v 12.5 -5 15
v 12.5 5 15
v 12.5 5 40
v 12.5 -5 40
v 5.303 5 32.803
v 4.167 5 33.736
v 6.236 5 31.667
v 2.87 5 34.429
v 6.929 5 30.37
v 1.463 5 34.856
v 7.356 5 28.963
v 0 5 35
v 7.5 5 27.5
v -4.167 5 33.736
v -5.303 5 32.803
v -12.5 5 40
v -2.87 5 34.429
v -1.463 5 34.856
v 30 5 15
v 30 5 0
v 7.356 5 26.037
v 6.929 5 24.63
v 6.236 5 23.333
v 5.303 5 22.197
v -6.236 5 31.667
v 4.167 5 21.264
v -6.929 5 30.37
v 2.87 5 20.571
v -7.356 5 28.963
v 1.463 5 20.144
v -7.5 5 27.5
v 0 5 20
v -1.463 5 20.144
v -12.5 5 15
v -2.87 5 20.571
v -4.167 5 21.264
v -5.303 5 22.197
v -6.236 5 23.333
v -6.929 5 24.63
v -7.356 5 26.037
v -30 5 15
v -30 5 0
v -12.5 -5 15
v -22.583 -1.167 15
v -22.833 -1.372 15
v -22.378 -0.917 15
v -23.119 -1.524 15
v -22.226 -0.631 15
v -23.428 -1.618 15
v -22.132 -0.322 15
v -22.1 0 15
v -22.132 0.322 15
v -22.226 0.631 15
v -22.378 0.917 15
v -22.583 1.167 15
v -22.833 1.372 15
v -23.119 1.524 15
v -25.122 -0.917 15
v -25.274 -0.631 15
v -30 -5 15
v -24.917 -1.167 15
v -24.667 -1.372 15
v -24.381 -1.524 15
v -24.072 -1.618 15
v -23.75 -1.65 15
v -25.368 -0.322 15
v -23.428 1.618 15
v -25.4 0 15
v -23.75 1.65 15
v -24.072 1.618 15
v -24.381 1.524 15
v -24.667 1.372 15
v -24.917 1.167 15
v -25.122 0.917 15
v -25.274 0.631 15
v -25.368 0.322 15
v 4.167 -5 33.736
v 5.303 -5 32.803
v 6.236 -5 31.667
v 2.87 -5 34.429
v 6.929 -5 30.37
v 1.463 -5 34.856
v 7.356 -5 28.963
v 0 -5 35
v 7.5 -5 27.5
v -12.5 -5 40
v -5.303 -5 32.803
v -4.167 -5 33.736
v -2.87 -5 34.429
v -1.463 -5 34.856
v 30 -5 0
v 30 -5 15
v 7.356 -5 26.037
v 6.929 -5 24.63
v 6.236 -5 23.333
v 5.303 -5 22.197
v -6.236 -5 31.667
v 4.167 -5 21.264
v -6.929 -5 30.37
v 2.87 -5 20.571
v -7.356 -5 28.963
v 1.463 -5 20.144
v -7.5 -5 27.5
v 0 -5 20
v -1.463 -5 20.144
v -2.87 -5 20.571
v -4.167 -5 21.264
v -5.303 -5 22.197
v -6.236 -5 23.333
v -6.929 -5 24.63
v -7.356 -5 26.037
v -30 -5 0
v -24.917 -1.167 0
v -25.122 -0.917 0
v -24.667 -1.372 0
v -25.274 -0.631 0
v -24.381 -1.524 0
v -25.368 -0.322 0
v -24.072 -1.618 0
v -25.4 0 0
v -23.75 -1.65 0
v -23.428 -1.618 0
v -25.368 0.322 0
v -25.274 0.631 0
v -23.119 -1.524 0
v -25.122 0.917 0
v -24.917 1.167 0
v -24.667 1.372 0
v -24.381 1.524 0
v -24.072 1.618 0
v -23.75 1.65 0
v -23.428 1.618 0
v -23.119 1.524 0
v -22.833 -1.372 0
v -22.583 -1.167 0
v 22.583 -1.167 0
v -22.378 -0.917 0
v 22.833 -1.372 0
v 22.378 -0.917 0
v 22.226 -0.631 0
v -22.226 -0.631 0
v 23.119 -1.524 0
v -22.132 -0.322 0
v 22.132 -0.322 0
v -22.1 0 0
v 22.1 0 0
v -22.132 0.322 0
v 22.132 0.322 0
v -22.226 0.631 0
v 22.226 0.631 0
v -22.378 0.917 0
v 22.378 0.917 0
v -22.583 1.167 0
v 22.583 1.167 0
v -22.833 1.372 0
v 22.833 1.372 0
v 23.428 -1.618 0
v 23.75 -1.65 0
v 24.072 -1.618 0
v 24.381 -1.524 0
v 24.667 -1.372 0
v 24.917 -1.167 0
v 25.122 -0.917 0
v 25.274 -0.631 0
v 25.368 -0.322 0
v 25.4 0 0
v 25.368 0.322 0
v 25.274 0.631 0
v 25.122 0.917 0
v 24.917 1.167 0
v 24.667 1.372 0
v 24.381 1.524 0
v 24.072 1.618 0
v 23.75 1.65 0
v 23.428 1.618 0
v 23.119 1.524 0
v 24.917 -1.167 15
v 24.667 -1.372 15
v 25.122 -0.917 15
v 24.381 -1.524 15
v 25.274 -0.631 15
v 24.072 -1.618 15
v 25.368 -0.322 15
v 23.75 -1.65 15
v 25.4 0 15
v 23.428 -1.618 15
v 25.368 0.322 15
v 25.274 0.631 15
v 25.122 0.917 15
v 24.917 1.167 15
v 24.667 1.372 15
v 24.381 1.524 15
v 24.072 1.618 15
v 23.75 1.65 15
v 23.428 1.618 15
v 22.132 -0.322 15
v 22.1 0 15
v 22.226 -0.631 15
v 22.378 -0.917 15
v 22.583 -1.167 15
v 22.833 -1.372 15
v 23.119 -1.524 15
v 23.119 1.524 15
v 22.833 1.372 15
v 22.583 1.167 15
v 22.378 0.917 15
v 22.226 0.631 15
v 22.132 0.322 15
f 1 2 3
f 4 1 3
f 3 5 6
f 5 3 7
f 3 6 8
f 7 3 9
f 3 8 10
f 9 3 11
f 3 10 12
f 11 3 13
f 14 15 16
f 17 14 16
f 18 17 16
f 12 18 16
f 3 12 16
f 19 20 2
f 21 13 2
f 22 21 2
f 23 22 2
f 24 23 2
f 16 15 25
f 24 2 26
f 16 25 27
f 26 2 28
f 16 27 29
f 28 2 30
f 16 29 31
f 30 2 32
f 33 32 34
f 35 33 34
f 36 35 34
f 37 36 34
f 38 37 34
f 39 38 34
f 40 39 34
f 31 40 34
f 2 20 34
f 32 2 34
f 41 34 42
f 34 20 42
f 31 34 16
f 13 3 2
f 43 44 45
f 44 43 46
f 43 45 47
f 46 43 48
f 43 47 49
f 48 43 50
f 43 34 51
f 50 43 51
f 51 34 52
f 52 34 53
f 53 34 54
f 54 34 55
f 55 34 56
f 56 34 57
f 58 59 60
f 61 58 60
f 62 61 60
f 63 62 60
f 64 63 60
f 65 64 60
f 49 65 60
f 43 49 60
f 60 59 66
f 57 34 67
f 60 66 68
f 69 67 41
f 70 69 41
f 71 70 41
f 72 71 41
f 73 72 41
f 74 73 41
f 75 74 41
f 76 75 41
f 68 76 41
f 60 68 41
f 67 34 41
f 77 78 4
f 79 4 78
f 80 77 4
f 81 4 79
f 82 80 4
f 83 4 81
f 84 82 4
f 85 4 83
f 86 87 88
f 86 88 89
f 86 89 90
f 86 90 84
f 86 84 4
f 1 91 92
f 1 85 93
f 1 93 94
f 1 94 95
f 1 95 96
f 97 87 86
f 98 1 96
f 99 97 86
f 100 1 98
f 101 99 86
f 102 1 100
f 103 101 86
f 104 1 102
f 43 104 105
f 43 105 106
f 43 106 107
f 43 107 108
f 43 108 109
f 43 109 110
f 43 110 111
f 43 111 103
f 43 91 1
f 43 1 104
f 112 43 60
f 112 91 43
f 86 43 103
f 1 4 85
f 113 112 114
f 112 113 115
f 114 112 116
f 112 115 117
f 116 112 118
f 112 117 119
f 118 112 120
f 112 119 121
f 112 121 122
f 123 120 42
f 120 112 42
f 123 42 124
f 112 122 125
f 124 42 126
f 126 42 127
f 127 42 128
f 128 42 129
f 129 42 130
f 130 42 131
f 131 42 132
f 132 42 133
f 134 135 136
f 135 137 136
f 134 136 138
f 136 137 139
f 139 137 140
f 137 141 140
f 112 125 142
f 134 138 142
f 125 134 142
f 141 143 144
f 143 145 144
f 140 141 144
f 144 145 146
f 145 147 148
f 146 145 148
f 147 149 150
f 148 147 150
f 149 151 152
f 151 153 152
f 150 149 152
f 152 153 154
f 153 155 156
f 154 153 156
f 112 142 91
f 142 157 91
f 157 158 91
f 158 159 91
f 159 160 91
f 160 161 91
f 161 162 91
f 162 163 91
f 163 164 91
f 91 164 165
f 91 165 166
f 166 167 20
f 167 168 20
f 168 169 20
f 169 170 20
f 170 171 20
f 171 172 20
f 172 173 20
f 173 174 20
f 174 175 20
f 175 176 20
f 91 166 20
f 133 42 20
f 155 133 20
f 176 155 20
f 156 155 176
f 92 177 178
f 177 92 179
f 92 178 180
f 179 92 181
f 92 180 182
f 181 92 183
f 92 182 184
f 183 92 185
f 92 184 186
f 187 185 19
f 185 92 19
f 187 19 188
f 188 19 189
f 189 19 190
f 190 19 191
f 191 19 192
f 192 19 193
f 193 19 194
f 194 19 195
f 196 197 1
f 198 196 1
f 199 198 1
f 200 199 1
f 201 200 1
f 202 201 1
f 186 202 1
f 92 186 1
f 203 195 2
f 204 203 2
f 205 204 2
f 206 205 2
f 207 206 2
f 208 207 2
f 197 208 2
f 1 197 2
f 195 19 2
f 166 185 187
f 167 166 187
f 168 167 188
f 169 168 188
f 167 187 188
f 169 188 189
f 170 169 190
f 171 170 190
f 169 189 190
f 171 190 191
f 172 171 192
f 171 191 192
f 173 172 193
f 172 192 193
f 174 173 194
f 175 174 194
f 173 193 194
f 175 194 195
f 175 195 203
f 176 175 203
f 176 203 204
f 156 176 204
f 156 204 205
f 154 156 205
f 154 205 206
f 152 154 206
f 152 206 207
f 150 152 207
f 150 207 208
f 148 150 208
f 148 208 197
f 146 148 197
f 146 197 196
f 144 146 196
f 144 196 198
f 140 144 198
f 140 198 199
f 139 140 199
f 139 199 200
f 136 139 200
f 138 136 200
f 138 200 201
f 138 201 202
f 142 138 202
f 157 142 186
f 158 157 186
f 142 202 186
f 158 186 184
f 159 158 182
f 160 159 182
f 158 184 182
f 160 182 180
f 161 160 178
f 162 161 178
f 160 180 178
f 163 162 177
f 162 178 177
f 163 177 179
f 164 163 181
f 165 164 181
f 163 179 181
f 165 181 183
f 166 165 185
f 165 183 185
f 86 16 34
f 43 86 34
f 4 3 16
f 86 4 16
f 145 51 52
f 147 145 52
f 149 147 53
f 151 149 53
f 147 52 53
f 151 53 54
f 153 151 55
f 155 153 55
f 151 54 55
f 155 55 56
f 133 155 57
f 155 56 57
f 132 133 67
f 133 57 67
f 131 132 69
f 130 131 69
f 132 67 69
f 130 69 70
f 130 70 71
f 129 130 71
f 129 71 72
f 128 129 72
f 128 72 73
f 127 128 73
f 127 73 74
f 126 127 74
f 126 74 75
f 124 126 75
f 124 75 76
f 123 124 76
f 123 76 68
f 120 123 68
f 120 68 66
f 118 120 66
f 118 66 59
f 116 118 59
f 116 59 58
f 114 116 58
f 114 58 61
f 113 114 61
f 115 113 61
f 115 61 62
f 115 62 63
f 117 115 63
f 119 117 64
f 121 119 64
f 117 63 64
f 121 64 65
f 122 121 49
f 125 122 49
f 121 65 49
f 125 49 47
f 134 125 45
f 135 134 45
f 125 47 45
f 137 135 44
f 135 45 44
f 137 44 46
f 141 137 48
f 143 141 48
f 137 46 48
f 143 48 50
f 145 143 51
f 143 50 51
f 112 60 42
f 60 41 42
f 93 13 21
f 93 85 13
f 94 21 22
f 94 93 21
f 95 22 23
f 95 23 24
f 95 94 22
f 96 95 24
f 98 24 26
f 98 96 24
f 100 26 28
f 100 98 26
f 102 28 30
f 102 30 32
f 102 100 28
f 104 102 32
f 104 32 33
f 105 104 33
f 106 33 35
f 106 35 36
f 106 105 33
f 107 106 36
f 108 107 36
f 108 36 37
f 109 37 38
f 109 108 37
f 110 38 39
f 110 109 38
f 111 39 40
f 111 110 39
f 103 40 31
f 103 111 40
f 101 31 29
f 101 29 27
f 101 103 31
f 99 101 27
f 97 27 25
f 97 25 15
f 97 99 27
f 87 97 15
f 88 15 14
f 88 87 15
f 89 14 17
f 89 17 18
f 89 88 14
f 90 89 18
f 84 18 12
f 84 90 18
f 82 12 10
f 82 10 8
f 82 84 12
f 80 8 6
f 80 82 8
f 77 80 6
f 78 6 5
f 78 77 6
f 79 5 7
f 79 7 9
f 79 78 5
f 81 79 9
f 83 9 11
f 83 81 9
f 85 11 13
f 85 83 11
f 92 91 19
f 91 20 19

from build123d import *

# Parameters (mm, degrees)
SKETCH_2_R         = 7.5
EXTRUDE_1_DEPTH    = 5
HOLE_WIZARD_M4_1_D = 3.3


with BuildPart() as part:
    # 草圖2 → 填料-伸長1 (new body, symmetric)
    with BuildSketch(Plane(origin=(0, 0, 0), x_dir=(1, 0, 0), z_dir=(0, 1, 0))):
        Polygon((-12.5, -40), (-12.5, -15), (-30, -15), (-30, 0), (30, 0), (30, -15), (12.5, -15), (12.5, -40), align=None)
        with Locations((0, -27.5)):
            Circle(SKETCH_2_R, mode=Mode.SUBTRACT)
    extrude(amount=EXTRUDE_1_DEPTH, both=True)

    # M4 螺紋孔1 (through all)
    with Locations(Plane(origin=(0, 0, 0), x_dir=(-1, 0, 0), z_dir=(0, 0, -1))):
        with Locations((-23.75, 0), (23.75, 0)):
            Hole(HOLE_WIZARD_M4_1_D / 2)


solid = part.part
